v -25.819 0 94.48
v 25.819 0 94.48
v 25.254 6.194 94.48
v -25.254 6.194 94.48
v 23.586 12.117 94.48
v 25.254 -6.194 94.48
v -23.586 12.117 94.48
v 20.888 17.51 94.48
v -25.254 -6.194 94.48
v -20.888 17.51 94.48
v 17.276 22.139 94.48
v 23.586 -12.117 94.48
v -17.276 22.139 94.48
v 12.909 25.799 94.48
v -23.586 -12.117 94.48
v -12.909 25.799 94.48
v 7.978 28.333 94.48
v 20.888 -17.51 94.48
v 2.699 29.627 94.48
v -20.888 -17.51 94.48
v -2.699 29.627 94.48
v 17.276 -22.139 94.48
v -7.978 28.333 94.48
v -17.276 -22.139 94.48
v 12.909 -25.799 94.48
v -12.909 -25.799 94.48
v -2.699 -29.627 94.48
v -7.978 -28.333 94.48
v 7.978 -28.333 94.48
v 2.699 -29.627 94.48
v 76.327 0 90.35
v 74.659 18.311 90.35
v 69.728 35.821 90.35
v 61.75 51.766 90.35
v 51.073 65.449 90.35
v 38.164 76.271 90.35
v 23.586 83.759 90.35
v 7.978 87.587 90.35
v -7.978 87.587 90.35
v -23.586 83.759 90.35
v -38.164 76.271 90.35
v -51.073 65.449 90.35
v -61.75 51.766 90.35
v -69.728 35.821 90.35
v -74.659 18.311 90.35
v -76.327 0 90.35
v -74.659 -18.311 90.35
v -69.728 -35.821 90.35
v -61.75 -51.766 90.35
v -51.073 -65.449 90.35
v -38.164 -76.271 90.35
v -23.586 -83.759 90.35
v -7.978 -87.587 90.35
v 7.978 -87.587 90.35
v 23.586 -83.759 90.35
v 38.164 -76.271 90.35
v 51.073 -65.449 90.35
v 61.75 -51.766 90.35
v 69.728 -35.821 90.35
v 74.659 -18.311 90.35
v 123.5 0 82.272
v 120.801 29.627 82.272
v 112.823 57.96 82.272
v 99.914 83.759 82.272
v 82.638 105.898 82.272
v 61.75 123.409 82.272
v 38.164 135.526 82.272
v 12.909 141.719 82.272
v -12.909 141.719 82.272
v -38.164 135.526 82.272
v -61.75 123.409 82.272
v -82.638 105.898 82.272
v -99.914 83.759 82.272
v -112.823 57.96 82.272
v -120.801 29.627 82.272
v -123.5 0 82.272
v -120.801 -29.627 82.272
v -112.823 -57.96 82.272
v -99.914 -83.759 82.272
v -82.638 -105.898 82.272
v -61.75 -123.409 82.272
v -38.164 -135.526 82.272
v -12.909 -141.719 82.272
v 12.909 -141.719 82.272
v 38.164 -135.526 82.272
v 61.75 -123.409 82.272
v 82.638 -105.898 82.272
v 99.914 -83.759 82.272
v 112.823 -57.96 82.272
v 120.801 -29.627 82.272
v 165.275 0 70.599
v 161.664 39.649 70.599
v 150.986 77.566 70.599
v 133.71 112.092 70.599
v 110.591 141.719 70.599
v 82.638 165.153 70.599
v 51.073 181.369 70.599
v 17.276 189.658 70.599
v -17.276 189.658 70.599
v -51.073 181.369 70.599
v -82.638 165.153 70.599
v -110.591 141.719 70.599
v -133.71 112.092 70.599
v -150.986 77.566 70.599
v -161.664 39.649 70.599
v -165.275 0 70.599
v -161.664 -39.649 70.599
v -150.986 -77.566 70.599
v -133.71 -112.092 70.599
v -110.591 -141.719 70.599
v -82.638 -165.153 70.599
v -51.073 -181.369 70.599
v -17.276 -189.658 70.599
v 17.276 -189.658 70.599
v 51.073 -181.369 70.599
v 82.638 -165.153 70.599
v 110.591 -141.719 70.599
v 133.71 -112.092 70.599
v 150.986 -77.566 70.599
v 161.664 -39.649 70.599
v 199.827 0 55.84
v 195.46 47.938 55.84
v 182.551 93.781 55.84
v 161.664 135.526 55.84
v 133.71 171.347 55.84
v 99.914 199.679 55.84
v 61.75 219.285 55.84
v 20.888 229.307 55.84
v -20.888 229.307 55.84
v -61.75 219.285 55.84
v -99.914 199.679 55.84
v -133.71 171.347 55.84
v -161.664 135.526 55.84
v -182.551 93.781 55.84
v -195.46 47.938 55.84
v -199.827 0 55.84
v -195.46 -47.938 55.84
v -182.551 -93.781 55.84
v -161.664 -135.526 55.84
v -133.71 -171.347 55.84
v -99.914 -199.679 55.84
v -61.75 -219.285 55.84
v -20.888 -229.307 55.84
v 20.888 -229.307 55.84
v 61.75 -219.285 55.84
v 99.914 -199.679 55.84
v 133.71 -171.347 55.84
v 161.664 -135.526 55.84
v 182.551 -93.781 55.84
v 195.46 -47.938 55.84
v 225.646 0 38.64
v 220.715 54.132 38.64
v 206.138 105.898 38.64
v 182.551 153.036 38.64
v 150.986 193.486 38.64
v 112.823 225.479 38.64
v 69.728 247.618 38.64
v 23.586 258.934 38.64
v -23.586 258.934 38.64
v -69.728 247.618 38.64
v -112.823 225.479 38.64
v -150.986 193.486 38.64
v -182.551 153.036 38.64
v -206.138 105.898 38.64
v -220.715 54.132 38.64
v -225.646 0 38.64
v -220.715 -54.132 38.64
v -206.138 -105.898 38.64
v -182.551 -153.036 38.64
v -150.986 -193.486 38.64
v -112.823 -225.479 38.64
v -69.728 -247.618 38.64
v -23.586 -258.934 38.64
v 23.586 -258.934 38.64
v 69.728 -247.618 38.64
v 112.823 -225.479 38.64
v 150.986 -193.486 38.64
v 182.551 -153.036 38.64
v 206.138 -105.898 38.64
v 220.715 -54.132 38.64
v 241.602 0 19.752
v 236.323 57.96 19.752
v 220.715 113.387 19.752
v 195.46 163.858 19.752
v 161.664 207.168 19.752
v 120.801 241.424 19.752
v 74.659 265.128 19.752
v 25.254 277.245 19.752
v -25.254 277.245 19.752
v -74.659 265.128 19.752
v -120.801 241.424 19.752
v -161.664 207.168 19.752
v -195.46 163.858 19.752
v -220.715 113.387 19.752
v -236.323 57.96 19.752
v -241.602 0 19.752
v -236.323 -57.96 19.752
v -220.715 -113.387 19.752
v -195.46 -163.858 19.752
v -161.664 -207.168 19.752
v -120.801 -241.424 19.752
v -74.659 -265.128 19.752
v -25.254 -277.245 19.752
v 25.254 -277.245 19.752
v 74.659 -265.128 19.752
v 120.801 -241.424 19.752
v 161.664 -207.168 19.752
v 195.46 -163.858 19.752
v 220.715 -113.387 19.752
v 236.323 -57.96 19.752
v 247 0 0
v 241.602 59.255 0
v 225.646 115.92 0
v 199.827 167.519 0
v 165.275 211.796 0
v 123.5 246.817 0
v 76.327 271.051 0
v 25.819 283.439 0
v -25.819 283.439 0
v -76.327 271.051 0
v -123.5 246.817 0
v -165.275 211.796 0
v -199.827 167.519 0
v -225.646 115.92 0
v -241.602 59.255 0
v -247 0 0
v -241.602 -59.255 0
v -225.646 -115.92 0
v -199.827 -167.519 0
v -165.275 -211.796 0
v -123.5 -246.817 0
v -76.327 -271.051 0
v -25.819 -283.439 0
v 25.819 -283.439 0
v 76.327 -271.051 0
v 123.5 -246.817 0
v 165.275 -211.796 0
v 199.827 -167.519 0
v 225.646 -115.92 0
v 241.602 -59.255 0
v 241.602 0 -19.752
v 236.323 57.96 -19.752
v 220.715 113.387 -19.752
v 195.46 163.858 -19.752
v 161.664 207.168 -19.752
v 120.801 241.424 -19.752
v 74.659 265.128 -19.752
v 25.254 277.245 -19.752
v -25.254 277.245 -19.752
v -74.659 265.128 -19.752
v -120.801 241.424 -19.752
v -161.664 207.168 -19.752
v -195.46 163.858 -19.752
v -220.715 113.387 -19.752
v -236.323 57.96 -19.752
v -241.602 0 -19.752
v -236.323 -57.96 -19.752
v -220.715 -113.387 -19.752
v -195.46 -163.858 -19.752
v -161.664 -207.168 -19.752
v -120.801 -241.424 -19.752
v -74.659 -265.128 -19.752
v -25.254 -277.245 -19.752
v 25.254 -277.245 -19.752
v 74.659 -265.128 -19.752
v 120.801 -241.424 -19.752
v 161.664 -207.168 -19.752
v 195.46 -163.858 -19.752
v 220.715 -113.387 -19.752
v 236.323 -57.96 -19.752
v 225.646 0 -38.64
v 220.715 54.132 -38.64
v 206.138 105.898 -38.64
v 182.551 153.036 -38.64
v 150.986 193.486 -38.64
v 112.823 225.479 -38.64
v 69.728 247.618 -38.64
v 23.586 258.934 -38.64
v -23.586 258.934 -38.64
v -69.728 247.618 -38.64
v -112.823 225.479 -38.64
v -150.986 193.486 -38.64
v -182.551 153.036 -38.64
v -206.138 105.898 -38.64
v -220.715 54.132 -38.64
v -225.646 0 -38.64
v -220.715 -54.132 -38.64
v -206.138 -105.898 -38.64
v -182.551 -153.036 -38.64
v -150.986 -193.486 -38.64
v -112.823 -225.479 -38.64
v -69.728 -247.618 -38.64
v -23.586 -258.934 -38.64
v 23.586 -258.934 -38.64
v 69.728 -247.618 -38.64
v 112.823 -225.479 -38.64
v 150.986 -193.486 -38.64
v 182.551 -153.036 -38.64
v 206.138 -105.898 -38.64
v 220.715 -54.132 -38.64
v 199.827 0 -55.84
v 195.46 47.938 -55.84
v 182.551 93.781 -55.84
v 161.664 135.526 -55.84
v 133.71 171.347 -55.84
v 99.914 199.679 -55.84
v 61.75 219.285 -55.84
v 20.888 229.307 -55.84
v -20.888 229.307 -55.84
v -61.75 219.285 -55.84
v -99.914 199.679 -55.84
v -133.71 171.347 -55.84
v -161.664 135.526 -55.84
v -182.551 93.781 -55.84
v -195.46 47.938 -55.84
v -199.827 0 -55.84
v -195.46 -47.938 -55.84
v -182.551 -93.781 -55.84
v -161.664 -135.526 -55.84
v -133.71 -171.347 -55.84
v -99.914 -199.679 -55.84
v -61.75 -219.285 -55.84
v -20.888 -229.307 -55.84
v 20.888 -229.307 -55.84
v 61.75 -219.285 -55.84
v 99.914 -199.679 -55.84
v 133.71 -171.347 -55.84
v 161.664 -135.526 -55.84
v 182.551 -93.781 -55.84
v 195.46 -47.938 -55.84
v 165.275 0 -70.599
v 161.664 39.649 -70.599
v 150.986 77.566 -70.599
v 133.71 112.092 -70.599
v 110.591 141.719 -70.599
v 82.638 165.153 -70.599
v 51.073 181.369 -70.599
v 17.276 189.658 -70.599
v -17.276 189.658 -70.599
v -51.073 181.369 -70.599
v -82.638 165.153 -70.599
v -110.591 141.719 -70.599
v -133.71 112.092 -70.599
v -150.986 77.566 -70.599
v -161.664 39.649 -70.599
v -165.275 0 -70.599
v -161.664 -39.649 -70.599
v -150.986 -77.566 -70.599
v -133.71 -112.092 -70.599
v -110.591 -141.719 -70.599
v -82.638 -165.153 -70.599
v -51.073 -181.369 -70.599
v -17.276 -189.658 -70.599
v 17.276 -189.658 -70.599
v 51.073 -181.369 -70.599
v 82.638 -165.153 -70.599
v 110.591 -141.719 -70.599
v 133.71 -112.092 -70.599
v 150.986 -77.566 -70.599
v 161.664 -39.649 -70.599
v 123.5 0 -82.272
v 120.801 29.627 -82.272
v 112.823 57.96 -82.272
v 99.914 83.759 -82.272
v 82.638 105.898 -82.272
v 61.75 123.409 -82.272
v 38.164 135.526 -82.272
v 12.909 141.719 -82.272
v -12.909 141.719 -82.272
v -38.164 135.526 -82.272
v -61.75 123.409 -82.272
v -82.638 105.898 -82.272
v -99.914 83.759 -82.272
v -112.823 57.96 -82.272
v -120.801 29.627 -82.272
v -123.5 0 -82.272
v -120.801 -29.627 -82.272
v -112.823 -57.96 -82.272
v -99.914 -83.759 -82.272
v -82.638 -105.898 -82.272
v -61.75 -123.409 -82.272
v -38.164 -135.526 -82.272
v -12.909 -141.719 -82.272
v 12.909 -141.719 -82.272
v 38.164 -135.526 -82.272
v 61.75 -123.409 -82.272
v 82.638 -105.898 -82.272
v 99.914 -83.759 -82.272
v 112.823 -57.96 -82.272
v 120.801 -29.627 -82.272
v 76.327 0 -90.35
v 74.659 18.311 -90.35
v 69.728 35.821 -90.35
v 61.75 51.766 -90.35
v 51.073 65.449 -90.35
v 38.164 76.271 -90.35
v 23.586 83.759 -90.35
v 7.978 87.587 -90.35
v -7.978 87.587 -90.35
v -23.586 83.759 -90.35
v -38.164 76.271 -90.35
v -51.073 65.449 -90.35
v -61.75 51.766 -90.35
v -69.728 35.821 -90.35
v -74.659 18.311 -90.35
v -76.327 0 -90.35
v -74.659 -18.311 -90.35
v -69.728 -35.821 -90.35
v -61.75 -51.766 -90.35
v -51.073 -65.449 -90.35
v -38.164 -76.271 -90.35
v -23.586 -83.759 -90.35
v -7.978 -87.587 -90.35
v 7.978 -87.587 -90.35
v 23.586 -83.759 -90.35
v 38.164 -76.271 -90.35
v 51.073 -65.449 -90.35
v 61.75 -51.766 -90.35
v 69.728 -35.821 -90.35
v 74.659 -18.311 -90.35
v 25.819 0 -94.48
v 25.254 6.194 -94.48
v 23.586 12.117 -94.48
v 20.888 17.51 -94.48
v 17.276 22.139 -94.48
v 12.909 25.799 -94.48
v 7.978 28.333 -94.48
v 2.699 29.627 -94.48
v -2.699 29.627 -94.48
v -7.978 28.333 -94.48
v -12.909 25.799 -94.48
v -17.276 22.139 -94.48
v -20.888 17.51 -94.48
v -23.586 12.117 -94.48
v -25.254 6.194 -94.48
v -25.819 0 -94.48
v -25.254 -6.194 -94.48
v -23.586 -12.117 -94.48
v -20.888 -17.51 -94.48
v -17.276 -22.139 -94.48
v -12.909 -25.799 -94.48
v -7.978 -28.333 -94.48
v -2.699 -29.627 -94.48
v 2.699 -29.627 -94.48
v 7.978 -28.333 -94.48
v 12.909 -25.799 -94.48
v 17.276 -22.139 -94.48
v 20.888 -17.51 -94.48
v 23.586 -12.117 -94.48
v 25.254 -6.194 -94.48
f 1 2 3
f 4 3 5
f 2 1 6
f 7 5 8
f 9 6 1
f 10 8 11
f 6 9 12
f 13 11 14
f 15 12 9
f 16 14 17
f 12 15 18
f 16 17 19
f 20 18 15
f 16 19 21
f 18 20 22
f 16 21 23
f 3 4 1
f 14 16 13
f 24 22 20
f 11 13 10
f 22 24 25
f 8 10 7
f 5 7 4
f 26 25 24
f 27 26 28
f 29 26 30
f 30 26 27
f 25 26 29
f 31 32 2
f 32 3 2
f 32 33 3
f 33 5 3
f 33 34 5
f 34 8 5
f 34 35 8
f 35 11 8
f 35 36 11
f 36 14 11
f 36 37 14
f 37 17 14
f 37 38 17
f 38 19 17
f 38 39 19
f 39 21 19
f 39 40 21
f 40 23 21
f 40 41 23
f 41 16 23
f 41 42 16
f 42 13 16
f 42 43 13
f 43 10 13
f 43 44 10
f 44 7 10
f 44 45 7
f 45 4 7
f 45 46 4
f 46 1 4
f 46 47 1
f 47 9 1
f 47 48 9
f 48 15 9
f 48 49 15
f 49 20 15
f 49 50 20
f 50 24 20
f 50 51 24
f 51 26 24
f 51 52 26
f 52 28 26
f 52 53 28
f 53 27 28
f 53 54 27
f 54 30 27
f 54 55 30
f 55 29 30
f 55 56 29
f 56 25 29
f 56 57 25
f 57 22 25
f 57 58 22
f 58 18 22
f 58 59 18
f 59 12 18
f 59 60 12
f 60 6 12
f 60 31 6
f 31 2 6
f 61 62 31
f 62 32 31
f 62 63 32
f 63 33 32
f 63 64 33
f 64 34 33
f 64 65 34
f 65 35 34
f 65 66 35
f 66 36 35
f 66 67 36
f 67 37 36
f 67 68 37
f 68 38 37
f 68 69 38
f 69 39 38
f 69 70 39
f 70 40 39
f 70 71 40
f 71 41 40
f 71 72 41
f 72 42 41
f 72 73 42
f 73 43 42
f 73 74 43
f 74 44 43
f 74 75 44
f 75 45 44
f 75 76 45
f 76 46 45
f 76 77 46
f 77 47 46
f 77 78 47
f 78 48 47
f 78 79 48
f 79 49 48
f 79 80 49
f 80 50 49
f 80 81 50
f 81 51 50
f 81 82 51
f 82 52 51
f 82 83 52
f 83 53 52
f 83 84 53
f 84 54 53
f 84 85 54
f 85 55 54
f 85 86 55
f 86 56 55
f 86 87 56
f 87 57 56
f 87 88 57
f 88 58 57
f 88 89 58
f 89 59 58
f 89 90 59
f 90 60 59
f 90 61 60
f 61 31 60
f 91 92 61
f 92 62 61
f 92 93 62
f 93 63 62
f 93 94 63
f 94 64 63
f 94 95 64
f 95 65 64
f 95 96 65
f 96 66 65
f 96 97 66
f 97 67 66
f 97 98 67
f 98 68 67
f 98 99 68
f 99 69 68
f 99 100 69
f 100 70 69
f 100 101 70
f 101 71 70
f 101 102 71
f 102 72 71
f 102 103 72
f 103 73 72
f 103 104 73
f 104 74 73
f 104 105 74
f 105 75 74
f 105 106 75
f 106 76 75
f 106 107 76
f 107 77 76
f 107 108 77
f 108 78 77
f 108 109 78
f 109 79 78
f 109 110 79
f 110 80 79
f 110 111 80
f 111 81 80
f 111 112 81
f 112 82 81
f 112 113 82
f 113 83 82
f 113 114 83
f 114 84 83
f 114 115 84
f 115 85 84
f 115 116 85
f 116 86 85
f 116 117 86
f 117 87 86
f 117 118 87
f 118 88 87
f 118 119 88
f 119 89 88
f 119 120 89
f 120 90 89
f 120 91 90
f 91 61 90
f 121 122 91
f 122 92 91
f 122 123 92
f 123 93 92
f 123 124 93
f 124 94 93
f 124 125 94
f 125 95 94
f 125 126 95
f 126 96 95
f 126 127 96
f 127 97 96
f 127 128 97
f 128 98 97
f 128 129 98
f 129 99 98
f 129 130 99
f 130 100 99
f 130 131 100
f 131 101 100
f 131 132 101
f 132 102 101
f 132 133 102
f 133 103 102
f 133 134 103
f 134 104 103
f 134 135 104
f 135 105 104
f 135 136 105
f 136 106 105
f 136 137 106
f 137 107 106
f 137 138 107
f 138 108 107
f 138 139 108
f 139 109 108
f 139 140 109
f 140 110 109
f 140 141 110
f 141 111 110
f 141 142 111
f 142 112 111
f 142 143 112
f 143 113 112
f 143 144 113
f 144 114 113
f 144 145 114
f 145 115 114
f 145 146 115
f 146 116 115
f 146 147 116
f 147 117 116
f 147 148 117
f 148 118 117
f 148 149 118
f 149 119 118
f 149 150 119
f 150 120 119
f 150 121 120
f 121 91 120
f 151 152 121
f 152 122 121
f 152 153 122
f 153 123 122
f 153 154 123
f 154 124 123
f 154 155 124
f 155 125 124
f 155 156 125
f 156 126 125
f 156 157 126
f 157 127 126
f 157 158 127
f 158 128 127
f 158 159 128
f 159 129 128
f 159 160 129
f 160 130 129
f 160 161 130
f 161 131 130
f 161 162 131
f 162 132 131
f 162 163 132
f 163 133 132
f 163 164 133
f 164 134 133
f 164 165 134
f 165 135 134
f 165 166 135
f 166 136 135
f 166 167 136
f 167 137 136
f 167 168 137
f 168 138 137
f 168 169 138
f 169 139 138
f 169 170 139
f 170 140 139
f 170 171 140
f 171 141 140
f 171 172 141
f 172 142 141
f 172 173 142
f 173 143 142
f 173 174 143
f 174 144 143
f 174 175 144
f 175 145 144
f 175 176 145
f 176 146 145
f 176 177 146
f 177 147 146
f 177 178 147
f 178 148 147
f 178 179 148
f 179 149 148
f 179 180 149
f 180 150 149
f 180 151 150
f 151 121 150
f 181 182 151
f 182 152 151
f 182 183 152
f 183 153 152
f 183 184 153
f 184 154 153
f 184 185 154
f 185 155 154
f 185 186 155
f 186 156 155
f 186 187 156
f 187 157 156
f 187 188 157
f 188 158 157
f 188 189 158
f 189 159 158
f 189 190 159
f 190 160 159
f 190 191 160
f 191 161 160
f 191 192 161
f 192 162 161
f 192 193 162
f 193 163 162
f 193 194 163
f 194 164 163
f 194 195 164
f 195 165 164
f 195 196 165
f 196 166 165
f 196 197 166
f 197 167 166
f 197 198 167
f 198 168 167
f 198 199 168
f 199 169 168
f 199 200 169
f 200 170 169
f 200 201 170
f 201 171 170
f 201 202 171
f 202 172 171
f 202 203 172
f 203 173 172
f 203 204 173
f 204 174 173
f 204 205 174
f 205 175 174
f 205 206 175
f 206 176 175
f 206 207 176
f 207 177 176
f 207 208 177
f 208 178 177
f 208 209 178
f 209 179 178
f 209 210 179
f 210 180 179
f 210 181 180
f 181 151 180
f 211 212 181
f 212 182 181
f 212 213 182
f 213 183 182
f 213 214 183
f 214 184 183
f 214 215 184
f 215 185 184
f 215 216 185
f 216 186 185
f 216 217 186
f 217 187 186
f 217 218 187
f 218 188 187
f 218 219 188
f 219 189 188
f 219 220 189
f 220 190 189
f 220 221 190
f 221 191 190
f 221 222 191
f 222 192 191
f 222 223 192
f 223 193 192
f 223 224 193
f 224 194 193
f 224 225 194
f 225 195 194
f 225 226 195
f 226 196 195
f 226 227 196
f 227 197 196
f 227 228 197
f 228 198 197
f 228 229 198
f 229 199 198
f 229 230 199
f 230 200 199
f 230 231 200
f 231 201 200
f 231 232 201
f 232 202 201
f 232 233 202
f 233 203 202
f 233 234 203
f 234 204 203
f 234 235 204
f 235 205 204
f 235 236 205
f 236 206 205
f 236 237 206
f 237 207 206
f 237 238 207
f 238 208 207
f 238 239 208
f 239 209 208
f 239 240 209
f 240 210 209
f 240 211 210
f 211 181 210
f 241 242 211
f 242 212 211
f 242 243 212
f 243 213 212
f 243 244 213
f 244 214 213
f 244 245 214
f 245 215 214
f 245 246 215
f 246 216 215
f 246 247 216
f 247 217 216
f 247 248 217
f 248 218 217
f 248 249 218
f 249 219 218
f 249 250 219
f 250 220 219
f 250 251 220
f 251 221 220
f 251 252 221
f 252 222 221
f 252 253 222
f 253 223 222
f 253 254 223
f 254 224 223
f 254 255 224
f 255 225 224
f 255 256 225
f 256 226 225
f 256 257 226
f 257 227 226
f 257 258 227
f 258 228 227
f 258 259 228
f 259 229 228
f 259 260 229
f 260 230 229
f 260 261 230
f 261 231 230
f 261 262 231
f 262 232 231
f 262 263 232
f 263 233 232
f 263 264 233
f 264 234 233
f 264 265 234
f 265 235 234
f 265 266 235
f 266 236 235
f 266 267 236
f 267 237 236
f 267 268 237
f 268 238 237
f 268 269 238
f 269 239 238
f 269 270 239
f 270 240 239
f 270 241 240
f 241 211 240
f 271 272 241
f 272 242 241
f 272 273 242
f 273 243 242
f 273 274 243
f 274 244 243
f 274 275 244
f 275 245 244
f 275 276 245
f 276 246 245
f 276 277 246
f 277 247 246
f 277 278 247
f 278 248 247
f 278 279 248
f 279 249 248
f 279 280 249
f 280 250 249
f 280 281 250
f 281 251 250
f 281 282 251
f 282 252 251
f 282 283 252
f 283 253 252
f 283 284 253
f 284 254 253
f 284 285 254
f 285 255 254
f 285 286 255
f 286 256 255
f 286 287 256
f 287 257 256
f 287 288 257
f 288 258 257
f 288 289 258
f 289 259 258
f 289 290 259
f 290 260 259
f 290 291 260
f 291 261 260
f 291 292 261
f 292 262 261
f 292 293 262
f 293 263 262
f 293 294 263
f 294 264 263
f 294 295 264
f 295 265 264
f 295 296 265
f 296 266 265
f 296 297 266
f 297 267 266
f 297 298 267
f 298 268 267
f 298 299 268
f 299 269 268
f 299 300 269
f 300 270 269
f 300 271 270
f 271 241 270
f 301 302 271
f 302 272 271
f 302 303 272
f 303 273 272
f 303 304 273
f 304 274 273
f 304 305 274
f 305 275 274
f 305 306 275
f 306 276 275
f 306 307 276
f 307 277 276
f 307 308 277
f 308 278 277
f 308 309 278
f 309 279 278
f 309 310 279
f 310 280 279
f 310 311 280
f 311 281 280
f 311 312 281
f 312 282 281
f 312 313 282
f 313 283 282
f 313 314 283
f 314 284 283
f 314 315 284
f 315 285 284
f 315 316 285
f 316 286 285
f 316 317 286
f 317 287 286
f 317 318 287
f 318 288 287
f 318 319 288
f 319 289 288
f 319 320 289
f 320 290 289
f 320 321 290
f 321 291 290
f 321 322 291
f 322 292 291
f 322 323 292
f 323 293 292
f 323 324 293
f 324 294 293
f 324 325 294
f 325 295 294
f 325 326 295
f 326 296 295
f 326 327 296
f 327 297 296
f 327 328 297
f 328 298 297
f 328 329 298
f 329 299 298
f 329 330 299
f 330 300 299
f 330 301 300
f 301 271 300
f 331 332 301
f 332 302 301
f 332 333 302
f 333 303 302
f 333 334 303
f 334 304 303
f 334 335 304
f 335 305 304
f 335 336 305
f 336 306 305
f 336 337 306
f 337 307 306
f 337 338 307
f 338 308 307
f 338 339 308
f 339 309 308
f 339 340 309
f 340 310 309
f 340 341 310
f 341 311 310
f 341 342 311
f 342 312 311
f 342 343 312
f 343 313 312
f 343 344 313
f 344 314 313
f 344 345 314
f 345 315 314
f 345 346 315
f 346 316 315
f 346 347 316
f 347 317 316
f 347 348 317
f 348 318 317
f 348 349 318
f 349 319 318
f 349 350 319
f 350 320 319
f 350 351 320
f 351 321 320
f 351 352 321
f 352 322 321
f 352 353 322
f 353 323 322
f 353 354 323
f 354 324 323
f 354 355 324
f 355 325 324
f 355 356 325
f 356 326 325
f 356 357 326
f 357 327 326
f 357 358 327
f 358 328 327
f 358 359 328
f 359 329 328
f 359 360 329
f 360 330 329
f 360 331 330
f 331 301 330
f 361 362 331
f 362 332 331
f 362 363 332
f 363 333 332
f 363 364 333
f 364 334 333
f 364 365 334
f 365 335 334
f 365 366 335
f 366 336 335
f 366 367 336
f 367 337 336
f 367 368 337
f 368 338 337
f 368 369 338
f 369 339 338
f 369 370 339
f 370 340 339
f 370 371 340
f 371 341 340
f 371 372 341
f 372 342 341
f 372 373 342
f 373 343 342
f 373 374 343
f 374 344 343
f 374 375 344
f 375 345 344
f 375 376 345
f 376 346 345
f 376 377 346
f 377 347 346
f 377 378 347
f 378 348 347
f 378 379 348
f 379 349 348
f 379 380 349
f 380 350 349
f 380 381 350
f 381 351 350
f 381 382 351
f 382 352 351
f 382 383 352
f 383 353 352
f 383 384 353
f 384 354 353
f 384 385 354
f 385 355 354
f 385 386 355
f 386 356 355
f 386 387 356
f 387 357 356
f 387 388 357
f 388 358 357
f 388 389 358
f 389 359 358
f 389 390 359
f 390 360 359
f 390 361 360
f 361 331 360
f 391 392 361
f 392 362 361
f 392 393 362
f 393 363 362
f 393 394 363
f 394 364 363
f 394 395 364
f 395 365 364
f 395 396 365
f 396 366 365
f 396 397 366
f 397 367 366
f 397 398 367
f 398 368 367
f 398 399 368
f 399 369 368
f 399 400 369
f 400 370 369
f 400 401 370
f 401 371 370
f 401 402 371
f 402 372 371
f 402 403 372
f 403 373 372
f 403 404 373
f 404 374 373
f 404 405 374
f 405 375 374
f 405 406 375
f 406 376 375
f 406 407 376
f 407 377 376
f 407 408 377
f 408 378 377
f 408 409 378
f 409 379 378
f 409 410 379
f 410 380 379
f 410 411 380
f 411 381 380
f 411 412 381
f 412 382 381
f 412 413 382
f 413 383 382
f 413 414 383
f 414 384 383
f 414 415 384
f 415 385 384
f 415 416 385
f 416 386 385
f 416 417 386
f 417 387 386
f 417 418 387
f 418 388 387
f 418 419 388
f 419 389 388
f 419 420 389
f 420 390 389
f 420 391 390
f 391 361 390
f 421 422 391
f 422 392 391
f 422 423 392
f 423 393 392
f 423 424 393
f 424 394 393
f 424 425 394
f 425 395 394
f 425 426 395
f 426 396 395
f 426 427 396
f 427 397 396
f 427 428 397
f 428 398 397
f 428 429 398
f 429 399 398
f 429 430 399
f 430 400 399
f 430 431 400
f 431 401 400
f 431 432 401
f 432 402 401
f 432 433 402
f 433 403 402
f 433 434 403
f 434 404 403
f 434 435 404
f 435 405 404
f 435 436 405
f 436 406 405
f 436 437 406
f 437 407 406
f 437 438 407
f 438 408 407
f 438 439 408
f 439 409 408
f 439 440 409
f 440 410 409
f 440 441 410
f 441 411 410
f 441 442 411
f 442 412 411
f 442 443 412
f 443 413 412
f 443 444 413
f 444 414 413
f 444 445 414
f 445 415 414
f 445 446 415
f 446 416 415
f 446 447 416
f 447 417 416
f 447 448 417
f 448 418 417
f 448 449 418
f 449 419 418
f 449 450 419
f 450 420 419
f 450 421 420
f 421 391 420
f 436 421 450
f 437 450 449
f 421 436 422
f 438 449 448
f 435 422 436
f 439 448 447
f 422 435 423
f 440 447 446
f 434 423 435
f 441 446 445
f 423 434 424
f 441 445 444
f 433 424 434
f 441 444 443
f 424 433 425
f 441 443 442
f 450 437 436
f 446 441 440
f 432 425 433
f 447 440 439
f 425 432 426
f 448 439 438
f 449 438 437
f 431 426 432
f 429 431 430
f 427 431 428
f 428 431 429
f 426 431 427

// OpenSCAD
// Generated by SolidPython 1.0.1 on 2020-07-29 00:46:51


scale(v = [13, 15, 5]) {
	sphere(r = 19);
}
/***********************************************
*********      SolidPython code:      **********
************************************************
 
# import packages: SolidPython
from solid import *
from solid.utils import *
from itertools import chain, combinations, permutations


class Resize:

    def __init__(self, scad_file):
        self.scad_file = scad_file
        #self.scad_file = import_scad(scad_file)
        # cone/cylinder param:
        self.r1 = 0
        self.r2 = 0
        self.h = 0
        # rectangular prism param:
        self.w = 0
        self.l = 0
        # ellipse param:
        self.r = 0

    # import OpenScad code (file name corresponds to shape)


    # classify shape + parameters
    def assign(self, param1, param2, param3):
        if self.scad_file == 'cone.scad':
            self.r1 = param1
            self.r2 = param2
            self.h = param3
        elif self.scad_file == 'cylinder.scad':
            self.r1 = param1
            self.r2 = param2
            self.h = param3
        elif self.scad_file == 'rectangularPrism.scad':
            self.h = param1
            self.l = param2
            self.w = param3
        else:
            self.r = param1
            self.h = param2

    # resize parameters
    def iterate(self):
        x = range(3, 20, 2)
        i = 1
        if self.scad_file == 'cone.scad':
            tempList = list(permutations(x, 2))
            for temp in tempList:
                param1 = temp[0]
                param2 = temp[1]
                filepath = 'produced_scad_files/' + 'cone' + str(param1) + '_' + str(param2) + '_' + '.scad'
                scad_render_to_file(cylinder(h=param1, r1=param2, r2=0), filepath)

        elif self.scad_file == 'cylinder.scad':
            tempList = list(permutations(x, 3))
            for temp in tempList:
                param1 = temp[0]
                param2 = temp[1]
                filepath = 'produced_scad_files/' + 'cylinder' + str(param1) + '_' + str(param2) + '_' + '.scad'
                scad_render_to_file(cylinder(h=param1, r1=param2, r2=param2), filepath)

        elif self.scad_file == 'rectangularPrism.scad':
            tempList = list(permutations(x, 3))
            for temp in tempList:
                param1 = temp[0]
                param2 = temp[1]
                param3 = temp[2]
                filepath = 'produced_scad_files/' + 'rectangularPrism' + str(param1) + '_' + str(param2) + '_' + str(
                    param3) + '.scad'
                scad_render_to_file(cube(size=(param1, param2, param3)), filepath)

        elif self.scad_file == 'ellipse.scad':
            tempList = list(permutations(x, 4))
            for temp in tempList:
                param1 = temp[0]
                param2 = temp[1]
                param3 = temp[2]
                param4 = temp[3]
                filepath = 'produced_scad_files/' + 'ellipse' + str(param1) + '_' + str(param2) + '_' + str(param3) + '_' + str(param4) + '.scad'
                scad_render_to_file(scale([param1, param2, param3])(sphere(r=param4)), filepath)

    def render_to_scadfile(self):
        scad_render_to_file(scad, 'example.scad') 
 
************************************************/
